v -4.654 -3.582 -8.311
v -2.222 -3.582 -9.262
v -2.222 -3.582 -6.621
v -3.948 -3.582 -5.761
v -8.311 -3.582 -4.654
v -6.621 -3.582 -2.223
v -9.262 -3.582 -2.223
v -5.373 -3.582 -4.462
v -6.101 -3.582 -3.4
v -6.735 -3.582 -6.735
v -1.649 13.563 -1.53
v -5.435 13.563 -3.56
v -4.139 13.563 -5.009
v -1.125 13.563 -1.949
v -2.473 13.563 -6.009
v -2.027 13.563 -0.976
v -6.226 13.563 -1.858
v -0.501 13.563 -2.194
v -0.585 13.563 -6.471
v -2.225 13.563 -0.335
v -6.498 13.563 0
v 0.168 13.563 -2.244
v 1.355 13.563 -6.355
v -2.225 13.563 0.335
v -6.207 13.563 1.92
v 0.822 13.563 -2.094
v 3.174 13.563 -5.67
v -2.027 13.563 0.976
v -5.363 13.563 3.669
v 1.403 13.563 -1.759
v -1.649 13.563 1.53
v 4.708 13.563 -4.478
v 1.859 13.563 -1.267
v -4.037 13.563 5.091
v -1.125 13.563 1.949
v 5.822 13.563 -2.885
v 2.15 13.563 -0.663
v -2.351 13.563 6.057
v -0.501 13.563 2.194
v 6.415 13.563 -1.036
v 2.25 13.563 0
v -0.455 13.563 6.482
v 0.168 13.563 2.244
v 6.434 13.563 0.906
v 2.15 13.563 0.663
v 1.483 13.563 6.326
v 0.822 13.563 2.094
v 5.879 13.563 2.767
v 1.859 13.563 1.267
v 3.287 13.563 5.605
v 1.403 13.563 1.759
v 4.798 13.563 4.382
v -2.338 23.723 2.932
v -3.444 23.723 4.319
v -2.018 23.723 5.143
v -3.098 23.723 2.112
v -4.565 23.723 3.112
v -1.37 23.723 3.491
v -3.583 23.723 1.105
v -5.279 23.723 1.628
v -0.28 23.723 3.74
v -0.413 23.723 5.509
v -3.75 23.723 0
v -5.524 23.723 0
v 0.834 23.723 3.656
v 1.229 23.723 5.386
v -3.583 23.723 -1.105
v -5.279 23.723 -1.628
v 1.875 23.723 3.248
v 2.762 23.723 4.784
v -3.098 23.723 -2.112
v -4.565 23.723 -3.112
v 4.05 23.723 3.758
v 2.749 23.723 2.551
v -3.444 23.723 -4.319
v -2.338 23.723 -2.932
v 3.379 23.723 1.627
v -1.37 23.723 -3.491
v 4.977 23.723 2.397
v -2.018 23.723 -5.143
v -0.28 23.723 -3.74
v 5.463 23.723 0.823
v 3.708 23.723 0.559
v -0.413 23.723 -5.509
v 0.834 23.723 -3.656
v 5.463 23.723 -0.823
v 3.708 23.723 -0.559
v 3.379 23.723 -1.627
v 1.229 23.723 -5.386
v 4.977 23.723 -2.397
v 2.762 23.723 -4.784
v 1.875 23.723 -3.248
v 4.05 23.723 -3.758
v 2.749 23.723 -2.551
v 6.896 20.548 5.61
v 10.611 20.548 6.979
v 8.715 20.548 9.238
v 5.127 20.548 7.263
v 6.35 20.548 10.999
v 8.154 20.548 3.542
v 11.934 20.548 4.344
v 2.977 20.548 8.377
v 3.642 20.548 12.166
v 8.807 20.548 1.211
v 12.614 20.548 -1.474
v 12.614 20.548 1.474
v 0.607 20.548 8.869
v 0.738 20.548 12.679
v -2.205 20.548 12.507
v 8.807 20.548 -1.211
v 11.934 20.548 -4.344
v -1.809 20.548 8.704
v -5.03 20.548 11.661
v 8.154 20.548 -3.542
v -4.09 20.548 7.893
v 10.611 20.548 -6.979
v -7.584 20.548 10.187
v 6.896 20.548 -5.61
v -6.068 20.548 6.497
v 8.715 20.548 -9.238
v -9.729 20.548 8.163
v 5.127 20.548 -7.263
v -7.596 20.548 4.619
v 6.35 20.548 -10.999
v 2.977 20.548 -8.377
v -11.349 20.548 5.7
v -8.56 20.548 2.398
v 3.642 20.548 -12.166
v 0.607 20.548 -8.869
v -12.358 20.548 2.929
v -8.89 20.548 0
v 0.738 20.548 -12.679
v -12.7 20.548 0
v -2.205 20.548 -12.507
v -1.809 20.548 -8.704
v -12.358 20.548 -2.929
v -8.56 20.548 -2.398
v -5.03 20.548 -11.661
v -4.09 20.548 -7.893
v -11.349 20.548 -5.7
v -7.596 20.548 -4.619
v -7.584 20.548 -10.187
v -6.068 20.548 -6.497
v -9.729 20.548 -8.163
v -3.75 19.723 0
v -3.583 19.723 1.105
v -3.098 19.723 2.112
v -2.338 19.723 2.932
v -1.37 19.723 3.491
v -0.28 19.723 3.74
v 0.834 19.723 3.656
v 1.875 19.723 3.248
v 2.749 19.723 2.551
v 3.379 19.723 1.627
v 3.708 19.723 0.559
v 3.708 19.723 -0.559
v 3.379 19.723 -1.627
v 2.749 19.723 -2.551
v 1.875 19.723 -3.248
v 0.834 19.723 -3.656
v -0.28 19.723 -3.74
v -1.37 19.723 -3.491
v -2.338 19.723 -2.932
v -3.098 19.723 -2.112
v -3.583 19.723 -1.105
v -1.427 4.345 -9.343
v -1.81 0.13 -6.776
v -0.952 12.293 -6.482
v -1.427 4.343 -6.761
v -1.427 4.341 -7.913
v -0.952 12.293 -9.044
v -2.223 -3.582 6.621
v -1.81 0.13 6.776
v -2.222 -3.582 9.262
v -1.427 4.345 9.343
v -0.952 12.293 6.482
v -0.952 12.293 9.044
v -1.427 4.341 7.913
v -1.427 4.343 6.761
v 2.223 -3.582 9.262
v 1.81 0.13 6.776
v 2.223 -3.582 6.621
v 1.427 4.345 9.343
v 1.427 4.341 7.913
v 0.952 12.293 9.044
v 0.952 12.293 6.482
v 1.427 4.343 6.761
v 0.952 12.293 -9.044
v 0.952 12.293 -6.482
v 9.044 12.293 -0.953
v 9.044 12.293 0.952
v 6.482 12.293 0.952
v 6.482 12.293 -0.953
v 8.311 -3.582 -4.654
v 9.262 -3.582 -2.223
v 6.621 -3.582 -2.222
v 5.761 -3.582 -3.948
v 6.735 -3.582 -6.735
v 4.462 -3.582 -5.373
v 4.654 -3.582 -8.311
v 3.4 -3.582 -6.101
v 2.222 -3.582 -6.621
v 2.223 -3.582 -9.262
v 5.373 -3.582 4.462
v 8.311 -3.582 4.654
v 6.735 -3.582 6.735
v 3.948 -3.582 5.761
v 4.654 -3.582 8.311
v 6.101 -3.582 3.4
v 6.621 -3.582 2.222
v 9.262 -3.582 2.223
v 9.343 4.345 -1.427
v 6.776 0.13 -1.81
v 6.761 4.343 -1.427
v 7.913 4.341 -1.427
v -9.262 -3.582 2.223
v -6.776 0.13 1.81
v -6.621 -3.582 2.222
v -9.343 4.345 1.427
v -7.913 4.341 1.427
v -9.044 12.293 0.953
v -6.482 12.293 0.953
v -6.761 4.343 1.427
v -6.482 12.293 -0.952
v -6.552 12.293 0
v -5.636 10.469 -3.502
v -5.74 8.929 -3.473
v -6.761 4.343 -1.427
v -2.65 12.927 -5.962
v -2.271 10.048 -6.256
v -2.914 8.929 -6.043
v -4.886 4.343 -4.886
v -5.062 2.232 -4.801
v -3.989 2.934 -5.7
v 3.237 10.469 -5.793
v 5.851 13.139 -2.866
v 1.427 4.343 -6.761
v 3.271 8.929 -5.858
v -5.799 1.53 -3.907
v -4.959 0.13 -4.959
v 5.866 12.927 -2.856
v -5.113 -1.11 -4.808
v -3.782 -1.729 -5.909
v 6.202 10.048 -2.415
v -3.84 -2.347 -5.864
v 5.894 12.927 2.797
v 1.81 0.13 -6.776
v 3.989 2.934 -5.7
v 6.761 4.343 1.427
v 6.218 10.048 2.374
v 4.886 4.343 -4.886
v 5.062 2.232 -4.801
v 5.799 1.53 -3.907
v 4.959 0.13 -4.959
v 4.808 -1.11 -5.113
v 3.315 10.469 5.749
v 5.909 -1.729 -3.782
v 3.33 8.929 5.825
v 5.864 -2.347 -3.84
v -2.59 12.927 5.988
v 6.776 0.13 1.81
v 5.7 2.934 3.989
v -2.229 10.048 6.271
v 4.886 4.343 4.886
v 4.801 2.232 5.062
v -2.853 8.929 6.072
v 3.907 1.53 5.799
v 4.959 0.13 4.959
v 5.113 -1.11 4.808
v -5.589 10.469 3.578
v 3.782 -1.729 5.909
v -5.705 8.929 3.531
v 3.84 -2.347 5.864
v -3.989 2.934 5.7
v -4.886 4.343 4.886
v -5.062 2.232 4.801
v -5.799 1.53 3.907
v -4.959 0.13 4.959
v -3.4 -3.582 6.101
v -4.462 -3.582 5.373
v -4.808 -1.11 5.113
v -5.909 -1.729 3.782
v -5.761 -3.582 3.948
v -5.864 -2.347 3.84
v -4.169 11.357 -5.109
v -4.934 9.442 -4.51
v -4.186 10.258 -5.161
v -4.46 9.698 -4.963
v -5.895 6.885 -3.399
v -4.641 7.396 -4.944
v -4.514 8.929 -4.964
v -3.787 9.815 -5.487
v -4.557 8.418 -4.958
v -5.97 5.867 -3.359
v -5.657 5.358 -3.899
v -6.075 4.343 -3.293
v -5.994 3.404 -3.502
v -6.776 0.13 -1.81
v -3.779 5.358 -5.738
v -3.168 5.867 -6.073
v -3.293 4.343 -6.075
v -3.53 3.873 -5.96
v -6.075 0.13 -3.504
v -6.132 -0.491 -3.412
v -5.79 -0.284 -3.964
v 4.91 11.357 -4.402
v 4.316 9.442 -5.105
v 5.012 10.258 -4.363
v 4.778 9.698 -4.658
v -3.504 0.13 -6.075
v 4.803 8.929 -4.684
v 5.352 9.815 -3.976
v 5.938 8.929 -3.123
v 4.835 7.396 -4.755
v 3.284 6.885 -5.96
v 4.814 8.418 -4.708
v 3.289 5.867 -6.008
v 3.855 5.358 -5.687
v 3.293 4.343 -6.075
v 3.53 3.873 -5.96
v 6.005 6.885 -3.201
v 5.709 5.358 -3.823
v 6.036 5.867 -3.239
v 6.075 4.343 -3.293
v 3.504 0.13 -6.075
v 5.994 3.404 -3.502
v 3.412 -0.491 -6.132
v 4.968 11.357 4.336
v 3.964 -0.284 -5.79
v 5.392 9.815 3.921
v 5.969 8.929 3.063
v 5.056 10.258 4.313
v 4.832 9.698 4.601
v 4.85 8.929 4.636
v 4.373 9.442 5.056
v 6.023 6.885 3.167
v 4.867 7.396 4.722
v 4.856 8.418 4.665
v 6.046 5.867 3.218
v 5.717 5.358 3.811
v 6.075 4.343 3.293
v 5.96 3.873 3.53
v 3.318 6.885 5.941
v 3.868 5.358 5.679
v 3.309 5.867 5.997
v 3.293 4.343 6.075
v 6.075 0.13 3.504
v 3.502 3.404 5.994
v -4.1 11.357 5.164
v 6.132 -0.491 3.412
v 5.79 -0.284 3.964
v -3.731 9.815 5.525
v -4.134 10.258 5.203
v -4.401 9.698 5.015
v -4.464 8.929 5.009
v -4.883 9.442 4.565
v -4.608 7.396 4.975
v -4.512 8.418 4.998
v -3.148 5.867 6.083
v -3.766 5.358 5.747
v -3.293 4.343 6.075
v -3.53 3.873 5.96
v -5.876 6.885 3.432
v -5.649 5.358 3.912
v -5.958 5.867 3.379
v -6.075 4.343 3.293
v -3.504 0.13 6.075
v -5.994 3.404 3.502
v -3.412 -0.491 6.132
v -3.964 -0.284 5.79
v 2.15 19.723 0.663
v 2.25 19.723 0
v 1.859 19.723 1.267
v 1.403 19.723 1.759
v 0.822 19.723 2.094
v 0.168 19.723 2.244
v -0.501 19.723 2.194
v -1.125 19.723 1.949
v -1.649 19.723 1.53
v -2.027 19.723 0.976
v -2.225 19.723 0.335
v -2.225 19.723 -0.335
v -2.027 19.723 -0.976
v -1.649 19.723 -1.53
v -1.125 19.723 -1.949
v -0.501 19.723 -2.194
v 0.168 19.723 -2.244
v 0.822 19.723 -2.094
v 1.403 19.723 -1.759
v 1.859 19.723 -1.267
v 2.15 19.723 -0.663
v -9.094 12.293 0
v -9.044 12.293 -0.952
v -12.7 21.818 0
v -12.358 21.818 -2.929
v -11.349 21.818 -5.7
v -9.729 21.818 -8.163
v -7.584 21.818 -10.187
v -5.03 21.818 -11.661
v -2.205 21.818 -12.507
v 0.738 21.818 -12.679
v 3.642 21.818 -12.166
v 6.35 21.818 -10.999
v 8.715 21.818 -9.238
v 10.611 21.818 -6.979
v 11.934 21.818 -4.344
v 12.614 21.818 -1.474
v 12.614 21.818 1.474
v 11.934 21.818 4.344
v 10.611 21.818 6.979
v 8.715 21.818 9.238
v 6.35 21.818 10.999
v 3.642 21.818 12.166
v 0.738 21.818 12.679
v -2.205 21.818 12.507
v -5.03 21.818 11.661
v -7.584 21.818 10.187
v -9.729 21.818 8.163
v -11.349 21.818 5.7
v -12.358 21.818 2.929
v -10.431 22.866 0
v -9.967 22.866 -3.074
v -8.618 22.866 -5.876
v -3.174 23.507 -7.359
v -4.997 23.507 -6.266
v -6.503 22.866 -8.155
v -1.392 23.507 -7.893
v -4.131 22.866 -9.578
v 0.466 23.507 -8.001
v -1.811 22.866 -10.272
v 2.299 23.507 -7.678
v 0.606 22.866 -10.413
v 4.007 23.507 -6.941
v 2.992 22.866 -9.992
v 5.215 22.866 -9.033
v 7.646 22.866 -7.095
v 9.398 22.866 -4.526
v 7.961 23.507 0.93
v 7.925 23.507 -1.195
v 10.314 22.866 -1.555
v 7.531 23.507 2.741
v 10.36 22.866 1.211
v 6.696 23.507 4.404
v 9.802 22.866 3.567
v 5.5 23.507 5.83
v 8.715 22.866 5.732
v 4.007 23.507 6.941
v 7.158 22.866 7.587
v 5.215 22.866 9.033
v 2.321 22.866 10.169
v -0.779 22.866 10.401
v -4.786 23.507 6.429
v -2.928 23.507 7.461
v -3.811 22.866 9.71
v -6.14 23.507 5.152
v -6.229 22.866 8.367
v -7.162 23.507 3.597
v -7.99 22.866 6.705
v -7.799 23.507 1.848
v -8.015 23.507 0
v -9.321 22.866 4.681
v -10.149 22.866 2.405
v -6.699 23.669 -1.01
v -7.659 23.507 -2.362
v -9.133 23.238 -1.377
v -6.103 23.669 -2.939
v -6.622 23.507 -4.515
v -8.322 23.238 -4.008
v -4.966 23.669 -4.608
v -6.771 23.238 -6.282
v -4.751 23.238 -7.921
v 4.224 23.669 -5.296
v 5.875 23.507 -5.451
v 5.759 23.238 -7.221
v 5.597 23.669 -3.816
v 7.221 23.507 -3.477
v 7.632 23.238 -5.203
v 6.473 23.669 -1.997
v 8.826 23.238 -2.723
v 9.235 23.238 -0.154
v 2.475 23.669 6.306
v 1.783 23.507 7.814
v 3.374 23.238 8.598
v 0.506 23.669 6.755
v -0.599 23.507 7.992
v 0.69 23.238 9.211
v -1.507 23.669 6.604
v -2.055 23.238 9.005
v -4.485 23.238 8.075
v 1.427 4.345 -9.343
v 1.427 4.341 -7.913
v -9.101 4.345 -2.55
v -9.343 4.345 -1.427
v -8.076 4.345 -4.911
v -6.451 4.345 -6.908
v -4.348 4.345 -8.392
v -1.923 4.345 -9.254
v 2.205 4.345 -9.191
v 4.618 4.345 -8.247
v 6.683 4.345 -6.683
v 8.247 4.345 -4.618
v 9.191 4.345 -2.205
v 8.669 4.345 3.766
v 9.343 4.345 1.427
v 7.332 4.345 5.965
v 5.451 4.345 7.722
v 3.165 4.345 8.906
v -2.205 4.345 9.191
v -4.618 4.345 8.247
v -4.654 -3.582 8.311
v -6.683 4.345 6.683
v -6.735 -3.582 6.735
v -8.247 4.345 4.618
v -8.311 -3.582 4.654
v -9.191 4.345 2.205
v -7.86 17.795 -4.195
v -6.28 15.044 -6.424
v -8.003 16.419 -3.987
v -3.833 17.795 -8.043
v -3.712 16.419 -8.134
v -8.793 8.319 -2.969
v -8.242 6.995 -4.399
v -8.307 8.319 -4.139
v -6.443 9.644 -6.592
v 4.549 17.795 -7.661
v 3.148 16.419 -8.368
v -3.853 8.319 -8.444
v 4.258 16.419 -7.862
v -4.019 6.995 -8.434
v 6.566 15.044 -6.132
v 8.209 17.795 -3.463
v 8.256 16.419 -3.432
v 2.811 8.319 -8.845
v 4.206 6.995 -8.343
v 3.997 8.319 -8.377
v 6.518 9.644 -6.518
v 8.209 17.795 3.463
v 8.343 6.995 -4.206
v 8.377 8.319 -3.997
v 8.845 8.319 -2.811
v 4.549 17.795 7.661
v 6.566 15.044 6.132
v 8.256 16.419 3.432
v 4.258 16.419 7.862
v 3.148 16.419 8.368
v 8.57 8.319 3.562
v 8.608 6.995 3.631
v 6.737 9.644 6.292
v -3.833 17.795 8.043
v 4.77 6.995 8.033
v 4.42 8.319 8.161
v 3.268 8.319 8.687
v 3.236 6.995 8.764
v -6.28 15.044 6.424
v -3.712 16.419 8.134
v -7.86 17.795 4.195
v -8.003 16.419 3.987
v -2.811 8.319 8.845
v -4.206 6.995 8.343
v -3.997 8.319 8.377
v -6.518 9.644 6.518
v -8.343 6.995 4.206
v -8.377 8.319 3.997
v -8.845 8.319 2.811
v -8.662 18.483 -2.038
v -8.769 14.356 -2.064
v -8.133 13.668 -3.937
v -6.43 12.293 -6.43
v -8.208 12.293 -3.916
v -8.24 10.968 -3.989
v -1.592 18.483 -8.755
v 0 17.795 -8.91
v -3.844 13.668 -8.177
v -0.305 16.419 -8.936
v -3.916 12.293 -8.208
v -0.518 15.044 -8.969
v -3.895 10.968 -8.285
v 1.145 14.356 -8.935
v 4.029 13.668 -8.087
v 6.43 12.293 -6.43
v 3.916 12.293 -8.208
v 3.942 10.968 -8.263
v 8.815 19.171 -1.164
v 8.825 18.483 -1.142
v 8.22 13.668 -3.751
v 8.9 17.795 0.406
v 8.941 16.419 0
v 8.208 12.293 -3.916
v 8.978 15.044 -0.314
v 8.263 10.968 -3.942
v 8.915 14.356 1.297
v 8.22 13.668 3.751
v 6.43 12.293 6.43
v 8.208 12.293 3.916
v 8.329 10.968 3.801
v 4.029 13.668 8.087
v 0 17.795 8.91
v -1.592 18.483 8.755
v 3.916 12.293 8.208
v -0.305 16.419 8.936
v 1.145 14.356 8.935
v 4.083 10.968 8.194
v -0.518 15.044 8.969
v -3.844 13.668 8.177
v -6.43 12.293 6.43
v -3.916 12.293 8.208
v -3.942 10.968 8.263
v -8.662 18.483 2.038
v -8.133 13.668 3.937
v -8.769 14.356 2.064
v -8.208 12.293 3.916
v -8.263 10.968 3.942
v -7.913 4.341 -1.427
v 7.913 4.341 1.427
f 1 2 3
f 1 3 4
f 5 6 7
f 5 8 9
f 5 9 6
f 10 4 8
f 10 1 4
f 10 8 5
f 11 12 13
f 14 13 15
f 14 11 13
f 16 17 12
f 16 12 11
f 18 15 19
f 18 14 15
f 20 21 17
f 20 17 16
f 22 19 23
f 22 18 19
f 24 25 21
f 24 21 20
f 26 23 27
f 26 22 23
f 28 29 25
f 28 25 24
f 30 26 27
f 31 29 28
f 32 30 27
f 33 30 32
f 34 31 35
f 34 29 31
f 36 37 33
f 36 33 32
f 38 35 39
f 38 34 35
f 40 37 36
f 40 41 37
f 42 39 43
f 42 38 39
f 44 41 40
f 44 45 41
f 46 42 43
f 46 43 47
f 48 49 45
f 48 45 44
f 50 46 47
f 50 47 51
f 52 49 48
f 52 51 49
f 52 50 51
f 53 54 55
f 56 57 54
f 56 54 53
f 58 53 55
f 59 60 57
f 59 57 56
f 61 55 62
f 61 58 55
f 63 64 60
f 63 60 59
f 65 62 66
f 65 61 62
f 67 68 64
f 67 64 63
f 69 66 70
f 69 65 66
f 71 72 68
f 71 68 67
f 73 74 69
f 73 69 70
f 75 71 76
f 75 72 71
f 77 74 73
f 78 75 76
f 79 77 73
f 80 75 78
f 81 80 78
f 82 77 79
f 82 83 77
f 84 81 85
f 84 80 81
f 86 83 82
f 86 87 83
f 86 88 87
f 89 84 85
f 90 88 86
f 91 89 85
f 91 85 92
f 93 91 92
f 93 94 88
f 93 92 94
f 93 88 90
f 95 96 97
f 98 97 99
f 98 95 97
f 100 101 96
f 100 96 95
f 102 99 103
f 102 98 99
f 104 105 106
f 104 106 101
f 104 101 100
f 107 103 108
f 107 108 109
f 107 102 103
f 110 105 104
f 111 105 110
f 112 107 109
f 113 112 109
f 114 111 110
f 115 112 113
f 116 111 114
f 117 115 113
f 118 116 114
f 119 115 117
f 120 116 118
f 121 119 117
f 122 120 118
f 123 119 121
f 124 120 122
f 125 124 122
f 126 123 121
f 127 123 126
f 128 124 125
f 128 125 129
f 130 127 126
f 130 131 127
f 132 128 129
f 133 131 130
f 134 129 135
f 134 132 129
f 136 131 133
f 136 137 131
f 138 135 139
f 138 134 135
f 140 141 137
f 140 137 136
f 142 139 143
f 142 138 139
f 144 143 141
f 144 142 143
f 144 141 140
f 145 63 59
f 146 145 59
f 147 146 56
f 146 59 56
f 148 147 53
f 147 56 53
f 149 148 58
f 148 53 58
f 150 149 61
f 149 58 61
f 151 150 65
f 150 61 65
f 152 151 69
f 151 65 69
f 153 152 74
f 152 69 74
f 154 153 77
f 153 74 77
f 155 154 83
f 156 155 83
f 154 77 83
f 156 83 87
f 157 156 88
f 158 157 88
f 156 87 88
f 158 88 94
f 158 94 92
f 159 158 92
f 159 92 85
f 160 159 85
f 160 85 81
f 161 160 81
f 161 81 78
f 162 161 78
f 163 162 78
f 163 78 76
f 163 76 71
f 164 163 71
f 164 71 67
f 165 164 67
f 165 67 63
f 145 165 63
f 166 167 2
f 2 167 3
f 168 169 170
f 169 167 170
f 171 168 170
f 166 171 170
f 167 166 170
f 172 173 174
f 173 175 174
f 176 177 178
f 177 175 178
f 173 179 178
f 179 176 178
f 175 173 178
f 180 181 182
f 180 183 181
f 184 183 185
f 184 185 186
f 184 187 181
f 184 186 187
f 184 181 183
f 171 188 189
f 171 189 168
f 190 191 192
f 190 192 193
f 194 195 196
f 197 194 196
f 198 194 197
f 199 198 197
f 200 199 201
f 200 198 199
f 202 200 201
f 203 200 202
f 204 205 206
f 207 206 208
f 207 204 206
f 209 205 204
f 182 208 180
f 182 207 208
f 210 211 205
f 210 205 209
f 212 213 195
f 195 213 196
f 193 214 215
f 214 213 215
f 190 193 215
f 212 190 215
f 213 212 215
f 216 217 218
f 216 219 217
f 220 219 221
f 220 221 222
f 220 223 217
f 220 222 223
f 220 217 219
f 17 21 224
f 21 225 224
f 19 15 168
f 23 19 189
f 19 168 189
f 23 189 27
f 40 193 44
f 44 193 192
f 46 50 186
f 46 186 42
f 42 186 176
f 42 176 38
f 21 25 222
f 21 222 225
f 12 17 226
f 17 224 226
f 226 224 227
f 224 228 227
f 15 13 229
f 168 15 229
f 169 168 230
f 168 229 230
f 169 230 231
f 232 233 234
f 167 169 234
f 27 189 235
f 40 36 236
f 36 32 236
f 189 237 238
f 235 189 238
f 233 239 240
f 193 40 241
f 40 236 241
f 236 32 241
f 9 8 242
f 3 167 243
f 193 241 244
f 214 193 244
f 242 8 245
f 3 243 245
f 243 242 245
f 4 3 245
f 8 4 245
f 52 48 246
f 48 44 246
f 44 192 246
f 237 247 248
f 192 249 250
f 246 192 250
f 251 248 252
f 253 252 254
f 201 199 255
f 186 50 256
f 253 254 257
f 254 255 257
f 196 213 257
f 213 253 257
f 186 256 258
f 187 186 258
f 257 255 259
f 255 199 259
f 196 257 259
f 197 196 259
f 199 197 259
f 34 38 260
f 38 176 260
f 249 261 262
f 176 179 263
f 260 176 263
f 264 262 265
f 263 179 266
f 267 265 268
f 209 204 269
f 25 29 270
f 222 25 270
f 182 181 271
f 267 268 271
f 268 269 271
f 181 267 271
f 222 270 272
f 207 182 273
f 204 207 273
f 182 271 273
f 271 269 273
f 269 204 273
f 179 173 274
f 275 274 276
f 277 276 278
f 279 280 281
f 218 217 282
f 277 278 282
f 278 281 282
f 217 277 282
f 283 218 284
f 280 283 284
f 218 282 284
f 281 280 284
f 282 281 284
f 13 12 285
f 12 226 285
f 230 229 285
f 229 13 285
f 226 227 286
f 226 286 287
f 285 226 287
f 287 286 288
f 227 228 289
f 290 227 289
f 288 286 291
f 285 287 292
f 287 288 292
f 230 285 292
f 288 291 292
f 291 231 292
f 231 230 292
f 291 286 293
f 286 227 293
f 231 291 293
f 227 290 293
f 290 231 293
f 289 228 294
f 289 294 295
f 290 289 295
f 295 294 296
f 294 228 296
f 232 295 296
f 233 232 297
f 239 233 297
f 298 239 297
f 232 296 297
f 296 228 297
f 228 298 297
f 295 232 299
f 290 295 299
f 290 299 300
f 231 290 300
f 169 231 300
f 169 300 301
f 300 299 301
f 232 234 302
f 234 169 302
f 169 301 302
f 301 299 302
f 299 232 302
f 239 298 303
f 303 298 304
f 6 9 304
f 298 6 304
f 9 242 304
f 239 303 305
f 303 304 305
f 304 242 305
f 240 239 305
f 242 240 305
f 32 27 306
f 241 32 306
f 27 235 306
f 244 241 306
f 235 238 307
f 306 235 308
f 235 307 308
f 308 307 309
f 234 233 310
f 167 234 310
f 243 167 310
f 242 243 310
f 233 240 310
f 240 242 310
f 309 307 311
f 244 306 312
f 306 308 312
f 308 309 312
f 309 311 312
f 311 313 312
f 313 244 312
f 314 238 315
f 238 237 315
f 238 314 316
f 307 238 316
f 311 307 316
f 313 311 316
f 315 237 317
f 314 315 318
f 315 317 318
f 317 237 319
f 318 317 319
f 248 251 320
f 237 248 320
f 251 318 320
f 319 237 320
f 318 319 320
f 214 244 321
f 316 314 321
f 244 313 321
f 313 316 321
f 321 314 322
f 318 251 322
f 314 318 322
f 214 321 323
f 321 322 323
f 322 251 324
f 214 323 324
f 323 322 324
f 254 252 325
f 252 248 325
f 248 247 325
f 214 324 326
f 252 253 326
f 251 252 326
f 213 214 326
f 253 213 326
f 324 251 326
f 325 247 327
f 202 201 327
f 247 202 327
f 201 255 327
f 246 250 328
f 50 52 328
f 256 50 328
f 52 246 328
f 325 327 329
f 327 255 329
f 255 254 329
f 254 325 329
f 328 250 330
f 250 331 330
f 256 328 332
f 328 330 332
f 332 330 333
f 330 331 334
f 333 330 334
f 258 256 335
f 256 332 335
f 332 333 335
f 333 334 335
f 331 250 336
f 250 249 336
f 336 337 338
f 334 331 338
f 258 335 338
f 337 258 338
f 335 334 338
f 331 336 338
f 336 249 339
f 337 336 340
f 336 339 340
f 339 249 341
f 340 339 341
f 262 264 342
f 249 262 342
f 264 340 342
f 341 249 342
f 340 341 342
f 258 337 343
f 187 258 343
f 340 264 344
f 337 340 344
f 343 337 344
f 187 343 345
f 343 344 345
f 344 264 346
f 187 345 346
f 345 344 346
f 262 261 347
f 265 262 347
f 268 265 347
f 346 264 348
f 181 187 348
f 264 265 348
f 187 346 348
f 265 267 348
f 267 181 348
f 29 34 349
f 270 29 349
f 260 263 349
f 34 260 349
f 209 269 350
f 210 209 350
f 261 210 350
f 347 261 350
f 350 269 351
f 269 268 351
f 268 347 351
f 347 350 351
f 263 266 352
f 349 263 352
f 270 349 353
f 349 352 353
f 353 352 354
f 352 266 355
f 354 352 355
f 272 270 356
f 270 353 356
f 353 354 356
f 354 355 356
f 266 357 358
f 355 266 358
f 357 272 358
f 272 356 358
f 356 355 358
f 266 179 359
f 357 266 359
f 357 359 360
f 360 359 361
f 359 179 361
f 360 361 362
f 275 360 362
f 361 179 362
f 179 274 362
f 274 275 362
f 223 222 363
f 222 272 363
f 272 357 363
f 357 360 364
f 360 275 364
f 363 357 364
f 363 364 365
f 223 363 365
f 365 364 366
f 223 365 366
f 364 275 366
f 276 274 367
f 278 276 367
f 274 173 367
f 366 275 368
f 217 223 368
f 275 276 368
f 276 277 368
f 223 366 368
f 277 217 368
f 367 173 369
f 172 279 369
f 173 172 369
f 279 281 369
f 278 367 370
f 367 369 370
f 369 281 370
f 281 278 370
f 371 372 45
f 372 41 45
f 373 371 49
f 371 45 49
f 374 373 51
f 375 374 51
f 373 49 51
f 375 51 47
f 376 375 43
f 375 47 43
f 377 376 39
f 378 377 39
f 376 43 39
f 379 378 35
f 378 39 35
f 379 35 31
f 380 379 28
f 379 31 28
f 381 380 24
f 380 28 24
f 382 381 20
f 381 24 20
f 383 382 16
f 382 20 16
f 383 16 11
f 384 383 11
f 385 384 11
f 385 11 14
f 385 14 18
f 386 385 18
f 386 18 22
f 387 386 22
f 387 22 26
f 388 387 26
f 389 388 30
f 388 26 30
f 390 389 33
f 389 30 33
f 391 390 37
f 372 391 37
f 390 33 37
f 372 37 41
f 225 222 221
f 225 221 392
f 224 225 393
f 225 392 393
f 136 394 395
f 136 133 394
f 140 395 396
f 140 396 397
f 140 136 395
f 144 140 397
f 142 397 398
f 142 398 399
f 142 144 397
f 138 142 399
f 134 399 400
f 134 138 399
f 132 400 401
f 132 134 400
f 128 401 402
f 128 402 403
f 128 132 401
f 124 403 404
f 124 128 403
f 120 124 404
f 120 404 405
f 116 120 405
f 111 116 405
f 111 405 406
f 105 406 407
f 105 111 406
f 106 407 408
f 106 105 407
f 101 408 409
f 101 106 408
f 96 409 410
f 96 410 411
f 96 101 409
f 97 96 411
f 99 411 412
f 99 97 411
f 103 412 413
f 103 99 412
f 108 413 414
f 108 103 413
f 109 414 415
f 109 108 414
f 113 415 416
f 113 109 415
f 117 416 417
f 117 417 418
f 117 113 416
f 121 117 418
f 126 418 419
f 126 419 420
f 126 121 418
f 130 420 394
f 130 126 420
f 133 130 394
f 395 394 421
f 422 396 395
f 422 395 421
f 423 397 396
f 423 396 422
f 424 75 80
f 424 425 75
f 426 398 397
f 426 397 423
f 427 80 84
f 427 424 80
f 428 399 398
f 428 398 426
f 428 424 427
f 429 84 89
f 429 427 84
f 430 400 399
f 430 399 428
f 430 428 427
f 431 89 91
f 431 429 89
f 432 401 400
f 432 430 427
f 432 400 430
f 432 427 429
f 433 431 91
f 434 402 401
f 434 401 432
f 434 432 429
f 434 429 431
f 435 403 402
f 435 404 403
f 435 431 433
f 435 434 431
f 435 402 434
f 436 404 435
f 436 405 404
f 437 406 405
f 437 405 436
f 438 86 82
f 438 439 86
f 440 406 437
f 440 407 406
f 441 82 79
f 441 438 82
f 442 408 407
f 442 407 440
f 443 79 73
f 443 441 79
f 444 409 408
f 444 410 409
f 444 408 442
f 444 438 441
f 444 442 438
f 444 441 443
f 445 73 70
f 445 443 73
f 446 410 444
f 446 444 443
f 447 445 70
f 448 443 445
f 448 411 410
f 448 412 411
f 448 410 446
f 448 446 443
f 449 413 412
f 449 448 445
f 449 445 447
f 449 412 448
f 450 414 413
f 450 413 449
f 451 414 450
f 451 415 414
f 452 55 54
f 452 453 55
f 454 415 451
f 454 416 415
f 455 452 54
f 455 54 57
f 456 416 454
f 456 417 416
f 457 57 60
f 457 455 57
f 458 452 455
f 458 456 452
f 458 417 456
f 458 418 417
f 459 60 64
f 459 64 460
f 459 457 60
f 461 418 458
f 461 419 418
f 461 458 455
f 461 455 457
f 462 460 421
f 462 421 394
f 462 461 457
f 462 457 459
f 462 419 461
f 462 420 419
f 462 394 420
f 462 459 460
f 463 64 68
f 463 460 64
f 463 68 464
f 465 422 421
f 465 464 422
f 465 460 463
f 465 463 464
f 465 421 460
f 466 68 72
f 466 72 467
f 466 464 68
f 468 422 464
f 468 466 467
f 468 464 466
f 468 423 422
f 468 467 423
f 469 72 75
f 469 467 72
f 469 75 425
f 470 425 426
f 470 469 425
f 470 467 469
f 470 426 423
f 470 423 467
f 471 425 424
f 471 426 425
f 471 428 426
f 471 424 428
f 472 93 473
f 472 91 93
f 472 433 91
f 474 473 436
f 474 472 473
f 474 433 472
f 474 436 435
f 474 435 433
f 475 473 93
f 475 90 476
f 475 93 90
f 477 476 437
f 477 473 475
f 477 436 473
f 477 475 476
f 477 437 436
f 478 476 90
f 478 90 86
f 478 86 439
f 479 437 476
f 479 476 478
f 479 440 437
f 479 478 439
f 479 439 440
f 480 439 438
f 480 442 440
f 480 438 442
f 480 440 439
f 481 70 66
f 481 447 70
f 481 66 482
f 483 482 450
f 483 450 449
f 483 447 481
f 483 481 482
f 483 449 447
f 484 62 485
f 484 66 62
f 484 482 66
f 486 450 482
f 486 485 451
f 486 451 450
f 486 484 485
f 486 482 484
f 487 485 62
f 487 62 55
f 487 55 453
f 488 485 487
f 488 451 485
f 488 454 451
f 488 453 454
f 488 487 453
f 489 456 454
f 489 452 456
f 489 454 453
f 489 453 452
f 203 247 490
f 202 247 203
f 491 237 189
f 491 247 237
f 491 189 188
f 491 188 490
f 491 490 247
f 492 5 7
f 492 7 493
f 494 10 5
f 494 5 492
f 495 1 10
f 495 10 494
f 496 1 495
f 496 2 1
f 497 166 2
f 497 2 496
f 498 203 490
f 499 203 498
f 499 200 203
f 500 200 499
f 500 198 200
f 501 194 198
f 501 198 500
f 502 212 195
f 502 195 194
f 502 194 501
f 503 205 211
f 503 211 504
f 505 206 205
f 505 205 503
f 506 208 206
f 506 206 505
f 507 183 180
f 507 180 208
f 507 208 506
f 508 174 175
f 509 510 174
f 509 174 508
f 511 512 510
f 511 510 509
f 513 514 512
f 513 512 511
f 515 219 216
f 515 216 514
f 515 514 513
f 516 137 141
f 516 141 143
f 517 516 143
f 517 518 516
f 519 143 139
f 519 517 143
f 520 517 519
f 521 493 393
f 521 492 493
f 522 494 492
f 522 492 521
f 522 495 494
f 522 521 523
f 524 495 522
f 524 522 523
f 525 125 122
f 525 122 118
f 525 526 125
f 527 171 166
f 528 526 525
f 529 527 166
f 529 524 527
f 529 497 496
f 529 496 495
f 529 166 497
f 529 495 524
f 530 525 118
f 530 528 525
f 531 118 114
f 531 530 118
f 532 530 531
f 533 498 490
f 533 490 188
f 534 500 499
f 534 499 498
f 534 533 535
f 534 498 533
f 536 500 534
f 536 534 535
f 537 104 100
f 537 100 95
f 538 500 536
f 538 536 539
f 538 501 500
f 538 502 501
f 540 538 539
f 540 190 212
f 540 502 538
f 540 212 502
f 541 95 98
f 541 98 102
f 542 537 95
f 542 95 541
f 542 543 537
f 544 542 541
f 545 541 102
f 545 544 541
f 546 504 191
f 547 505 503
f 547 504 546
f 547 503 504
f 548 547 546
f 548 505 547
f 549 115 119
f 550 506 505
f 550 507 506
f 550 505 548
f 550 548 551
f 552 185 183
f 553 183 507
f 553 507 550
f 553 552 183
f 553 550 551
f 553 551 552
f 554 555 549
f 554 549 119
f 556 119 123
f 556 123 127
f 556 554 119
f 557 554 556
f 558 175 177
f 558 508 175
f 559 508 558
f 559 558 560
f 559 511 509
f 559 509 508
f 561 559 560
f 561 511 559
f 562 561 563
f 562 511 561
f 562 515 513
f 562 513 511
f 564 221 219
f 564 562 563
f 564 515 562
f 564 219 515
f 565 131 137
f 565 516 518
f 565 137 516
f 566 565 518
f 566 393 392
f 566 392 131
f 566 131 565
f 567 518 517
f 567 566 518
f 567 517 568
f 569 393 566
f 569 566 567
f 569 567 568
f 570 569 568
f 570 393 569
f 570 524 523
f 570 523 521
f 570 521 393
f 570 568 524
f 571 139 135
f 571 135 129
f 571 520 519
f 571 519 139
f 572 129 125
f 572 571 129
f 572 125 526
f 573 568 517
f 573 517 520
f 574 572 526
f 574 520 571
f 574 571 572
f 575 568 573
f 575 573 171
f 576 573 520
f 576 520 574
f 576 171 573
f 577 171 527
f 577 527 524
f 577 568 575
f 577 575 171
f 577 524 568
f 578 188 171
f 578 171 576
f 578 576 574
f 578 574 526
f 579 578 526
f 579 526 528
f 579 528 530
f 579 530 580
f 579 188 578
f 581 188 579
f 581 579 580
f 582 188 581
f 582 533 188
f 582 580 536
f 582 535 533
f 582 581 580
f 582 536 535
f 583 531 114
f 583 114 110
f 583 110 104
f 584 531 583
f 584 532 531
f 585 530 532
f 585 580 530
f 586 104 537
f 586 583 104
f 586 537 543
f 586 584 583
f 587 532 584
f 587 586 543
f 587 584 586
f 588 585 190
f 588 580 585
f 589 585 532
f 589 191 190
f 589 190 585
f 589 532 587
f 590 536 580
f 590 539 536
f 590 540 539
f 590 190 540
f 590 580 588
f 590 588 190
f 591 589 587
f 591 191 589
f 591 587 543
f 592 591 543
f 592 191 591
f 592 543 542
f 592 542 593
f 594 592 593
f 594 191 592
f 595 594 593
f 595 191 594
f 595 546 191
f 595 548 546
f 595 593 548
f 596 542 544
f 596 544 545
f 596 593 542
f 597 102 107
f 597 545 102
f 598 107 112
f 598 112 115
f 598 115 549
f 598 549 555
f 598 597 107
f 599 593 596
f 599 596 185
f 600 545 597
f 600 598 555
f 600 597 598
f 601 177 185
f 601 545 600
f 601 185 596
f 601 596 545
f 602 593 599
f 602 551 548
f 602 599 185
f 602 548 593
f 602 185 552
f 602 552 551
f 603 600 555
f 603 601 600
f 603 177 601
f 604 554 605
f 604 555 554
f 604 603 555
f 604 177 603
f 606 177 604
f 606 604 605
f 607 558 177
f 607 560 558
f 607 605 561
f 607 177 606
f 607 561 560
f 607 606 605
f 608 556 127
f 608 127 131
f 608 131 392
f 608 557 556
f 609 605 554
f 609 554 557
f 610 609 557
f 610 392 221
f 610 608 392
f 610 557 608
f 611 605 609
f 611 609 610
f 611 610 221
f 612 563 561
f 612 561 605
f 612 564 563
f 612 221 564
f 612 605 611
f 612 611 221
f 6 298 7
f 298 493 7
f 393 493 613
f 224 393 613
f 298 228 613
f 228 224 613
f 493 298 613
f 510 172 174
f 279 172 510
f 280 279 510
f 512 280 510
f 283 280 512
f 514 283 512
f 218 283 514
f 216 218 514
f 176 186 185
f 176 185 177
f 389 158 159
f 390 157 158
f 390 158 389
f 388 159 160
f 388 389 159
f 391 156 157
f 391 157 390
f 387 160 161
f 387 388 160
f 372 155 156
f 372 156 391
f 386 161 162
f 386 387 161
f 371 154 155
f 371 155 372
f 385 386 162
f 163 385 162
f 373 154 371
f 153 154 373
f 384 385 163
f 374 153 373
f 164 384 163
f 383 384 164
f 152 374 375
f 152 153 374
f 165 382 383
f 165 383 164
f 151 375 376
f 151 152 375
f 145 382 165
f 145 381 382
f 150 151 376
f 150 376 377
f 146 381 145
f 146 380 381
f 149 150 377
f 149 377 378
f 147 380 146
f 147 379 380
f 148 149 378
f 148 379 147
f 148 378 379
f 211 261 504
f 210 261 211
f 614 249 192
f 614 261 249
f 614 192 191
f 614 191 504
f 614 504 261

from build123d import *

# Parameters (mm, degrees)
SHELL1_T                                = -2.54
CUT_EXTRUDE2_DEPTH                      = 38.003022678
CIRPATTERN1_COUNT                       = 2
CIRPATTERN1_ANGLE                       = 90
BOSS_EXTRUDE3_DEPTH                     = 6.985
BOSS_EXTRUDE3_DEPTH_BACK                = 2.54
SKETCH13_R                              = 8.663884536
CBORE_FOR_M5_HEX_HEAD_BOLT2_D           = 4.5
CBORE_FOR_M5_HEX_HEAD_BOLT2_CBORE_D     = 7.5
CBORE_FOR_M5_HEX_HEAD_BOLT2_CBORE_DEPTH = 4


with BuildPart() as part:
    # Sketch1 → Revolve1 (revolve)
    with BuildSketch(Plane.XY, mode=Mode.PRIVATE) as revolve1_sk:
        with BuildLine():
            Line((0, 23.722851324), (5.5245, 23.722851324))
            ThreePointArc((5.5245, 23.722851324), (9.236535333, 23.238492745), (12.7, 21.817851324))
            Line((12.7, 21.817851324), (12.7, 20.547851324))
            Line((12.7, 20.547851324), (8.89, 20.547851324))
            add(Edge.make_bspline(
                [(8.89, 20.547851324), (8.84961008, 12.497906194), (9.741228483, 4.469234919), (9.525, -3.582148676)],
                knots=[0, 0, 0, 0, 1, 1, 1, 1], degree=3))
            Line((9.525, -3.582148676), (0, -3.582148676))
            Line((0, -3.582148676), (0, 23.722851324))
        make_face()
    revolve(revolve1_sk.sketch.rotate(Axis((0, 23.722851324, 0), (0, -1, 0)), 180), axis=Axis((0, 23.722851324, 0), (0, -1, 0)))

    # Shell1
    shell1_openings = [part.faces().sort_by_distance(p)[0] for p in [
        (0, -3.582148676, 0),
    ]]
    offset(amount=SHELL1_T, openings=shell1_openings, kind=Kind.INTERSECTION)

    # Sketch4 → Cut-Extrude2 (cut, through all)
    with BuildSketch(Plane.XY.offset(12.7)):
        with BuildLine():
            Line((0.9525, 12.292851324), (-0.9525, 12.292851324))
            add(Edge.make_bspline(
                [(-0.9525, 12.292851324), (-1.266575854, 4.327293664), (-2.2225, -3.582148676)],
                knots=[0, 0, 0, 1, 1, 1], degree=2))
            Line((-2.2225, -3.582148676), (2.2225, -3.582148676))
            add(Edge.make_bspline(
                [(0.9525, 12.292851324), (1.266575854, 4.327293664), (2.2225, -3.582148676)],
                knots=[0, 0, 0, 1, 1, 1], degree=2))
        make_face()
    cut_extrude2 = extrude(amount=-CUT_EXTRUDE2_DEPTH, mode=Mode.SUBTRACT)

    # CirPattern1: Cut-Extrude2 ×2 about axis
    cirpattern1_axis = Axis((0, 0, 0), (0, -1, 0))
    for i in range(1, CIRPATTERN1_COUNT):
        add(cut_extrude2.rotate(cirpattern1_axis, i * CIRPATTERN1_ANGLE / (CIRPATTERN1_COUNT - 1)), mode=Mode.SUBTRACT)

    # Sketch13 → Boss-Extrude3 (add, two sides: drawn at the far end of the back side and taken through both)
    with BuildSketch(Plane.XZ.offset(-20.547851324).offset(-BOSS_EXTRUDE3_DEPTH_BACK)):
        Circle(SKETCH13_R)
    extrude(amount=BOSS_EXTRUDE3_DEPTH + BOSS_EXTRUDE3_DEPTH_BACK)

    # CBORE for M5 Hex Head Bolt2 (through all)
    with Locations(Plane(origin=(0, 23.722851324, 0), x_dir=(-1, 0, 0), z_dir=(0, 1, 0))):
        with Locations((0, 0)):
            CounterBoreHole(CBORE_FOR_M5_HEX_HEAD_BOLT2_D / 2, CBORE_FOR_M5_HEX_HEAD_BOLT2_CBORE_D / 2, CBORE_FOR_M5_HEX_HEAD_BOLT2_CBORE_DEPTH)


solid = part.part
